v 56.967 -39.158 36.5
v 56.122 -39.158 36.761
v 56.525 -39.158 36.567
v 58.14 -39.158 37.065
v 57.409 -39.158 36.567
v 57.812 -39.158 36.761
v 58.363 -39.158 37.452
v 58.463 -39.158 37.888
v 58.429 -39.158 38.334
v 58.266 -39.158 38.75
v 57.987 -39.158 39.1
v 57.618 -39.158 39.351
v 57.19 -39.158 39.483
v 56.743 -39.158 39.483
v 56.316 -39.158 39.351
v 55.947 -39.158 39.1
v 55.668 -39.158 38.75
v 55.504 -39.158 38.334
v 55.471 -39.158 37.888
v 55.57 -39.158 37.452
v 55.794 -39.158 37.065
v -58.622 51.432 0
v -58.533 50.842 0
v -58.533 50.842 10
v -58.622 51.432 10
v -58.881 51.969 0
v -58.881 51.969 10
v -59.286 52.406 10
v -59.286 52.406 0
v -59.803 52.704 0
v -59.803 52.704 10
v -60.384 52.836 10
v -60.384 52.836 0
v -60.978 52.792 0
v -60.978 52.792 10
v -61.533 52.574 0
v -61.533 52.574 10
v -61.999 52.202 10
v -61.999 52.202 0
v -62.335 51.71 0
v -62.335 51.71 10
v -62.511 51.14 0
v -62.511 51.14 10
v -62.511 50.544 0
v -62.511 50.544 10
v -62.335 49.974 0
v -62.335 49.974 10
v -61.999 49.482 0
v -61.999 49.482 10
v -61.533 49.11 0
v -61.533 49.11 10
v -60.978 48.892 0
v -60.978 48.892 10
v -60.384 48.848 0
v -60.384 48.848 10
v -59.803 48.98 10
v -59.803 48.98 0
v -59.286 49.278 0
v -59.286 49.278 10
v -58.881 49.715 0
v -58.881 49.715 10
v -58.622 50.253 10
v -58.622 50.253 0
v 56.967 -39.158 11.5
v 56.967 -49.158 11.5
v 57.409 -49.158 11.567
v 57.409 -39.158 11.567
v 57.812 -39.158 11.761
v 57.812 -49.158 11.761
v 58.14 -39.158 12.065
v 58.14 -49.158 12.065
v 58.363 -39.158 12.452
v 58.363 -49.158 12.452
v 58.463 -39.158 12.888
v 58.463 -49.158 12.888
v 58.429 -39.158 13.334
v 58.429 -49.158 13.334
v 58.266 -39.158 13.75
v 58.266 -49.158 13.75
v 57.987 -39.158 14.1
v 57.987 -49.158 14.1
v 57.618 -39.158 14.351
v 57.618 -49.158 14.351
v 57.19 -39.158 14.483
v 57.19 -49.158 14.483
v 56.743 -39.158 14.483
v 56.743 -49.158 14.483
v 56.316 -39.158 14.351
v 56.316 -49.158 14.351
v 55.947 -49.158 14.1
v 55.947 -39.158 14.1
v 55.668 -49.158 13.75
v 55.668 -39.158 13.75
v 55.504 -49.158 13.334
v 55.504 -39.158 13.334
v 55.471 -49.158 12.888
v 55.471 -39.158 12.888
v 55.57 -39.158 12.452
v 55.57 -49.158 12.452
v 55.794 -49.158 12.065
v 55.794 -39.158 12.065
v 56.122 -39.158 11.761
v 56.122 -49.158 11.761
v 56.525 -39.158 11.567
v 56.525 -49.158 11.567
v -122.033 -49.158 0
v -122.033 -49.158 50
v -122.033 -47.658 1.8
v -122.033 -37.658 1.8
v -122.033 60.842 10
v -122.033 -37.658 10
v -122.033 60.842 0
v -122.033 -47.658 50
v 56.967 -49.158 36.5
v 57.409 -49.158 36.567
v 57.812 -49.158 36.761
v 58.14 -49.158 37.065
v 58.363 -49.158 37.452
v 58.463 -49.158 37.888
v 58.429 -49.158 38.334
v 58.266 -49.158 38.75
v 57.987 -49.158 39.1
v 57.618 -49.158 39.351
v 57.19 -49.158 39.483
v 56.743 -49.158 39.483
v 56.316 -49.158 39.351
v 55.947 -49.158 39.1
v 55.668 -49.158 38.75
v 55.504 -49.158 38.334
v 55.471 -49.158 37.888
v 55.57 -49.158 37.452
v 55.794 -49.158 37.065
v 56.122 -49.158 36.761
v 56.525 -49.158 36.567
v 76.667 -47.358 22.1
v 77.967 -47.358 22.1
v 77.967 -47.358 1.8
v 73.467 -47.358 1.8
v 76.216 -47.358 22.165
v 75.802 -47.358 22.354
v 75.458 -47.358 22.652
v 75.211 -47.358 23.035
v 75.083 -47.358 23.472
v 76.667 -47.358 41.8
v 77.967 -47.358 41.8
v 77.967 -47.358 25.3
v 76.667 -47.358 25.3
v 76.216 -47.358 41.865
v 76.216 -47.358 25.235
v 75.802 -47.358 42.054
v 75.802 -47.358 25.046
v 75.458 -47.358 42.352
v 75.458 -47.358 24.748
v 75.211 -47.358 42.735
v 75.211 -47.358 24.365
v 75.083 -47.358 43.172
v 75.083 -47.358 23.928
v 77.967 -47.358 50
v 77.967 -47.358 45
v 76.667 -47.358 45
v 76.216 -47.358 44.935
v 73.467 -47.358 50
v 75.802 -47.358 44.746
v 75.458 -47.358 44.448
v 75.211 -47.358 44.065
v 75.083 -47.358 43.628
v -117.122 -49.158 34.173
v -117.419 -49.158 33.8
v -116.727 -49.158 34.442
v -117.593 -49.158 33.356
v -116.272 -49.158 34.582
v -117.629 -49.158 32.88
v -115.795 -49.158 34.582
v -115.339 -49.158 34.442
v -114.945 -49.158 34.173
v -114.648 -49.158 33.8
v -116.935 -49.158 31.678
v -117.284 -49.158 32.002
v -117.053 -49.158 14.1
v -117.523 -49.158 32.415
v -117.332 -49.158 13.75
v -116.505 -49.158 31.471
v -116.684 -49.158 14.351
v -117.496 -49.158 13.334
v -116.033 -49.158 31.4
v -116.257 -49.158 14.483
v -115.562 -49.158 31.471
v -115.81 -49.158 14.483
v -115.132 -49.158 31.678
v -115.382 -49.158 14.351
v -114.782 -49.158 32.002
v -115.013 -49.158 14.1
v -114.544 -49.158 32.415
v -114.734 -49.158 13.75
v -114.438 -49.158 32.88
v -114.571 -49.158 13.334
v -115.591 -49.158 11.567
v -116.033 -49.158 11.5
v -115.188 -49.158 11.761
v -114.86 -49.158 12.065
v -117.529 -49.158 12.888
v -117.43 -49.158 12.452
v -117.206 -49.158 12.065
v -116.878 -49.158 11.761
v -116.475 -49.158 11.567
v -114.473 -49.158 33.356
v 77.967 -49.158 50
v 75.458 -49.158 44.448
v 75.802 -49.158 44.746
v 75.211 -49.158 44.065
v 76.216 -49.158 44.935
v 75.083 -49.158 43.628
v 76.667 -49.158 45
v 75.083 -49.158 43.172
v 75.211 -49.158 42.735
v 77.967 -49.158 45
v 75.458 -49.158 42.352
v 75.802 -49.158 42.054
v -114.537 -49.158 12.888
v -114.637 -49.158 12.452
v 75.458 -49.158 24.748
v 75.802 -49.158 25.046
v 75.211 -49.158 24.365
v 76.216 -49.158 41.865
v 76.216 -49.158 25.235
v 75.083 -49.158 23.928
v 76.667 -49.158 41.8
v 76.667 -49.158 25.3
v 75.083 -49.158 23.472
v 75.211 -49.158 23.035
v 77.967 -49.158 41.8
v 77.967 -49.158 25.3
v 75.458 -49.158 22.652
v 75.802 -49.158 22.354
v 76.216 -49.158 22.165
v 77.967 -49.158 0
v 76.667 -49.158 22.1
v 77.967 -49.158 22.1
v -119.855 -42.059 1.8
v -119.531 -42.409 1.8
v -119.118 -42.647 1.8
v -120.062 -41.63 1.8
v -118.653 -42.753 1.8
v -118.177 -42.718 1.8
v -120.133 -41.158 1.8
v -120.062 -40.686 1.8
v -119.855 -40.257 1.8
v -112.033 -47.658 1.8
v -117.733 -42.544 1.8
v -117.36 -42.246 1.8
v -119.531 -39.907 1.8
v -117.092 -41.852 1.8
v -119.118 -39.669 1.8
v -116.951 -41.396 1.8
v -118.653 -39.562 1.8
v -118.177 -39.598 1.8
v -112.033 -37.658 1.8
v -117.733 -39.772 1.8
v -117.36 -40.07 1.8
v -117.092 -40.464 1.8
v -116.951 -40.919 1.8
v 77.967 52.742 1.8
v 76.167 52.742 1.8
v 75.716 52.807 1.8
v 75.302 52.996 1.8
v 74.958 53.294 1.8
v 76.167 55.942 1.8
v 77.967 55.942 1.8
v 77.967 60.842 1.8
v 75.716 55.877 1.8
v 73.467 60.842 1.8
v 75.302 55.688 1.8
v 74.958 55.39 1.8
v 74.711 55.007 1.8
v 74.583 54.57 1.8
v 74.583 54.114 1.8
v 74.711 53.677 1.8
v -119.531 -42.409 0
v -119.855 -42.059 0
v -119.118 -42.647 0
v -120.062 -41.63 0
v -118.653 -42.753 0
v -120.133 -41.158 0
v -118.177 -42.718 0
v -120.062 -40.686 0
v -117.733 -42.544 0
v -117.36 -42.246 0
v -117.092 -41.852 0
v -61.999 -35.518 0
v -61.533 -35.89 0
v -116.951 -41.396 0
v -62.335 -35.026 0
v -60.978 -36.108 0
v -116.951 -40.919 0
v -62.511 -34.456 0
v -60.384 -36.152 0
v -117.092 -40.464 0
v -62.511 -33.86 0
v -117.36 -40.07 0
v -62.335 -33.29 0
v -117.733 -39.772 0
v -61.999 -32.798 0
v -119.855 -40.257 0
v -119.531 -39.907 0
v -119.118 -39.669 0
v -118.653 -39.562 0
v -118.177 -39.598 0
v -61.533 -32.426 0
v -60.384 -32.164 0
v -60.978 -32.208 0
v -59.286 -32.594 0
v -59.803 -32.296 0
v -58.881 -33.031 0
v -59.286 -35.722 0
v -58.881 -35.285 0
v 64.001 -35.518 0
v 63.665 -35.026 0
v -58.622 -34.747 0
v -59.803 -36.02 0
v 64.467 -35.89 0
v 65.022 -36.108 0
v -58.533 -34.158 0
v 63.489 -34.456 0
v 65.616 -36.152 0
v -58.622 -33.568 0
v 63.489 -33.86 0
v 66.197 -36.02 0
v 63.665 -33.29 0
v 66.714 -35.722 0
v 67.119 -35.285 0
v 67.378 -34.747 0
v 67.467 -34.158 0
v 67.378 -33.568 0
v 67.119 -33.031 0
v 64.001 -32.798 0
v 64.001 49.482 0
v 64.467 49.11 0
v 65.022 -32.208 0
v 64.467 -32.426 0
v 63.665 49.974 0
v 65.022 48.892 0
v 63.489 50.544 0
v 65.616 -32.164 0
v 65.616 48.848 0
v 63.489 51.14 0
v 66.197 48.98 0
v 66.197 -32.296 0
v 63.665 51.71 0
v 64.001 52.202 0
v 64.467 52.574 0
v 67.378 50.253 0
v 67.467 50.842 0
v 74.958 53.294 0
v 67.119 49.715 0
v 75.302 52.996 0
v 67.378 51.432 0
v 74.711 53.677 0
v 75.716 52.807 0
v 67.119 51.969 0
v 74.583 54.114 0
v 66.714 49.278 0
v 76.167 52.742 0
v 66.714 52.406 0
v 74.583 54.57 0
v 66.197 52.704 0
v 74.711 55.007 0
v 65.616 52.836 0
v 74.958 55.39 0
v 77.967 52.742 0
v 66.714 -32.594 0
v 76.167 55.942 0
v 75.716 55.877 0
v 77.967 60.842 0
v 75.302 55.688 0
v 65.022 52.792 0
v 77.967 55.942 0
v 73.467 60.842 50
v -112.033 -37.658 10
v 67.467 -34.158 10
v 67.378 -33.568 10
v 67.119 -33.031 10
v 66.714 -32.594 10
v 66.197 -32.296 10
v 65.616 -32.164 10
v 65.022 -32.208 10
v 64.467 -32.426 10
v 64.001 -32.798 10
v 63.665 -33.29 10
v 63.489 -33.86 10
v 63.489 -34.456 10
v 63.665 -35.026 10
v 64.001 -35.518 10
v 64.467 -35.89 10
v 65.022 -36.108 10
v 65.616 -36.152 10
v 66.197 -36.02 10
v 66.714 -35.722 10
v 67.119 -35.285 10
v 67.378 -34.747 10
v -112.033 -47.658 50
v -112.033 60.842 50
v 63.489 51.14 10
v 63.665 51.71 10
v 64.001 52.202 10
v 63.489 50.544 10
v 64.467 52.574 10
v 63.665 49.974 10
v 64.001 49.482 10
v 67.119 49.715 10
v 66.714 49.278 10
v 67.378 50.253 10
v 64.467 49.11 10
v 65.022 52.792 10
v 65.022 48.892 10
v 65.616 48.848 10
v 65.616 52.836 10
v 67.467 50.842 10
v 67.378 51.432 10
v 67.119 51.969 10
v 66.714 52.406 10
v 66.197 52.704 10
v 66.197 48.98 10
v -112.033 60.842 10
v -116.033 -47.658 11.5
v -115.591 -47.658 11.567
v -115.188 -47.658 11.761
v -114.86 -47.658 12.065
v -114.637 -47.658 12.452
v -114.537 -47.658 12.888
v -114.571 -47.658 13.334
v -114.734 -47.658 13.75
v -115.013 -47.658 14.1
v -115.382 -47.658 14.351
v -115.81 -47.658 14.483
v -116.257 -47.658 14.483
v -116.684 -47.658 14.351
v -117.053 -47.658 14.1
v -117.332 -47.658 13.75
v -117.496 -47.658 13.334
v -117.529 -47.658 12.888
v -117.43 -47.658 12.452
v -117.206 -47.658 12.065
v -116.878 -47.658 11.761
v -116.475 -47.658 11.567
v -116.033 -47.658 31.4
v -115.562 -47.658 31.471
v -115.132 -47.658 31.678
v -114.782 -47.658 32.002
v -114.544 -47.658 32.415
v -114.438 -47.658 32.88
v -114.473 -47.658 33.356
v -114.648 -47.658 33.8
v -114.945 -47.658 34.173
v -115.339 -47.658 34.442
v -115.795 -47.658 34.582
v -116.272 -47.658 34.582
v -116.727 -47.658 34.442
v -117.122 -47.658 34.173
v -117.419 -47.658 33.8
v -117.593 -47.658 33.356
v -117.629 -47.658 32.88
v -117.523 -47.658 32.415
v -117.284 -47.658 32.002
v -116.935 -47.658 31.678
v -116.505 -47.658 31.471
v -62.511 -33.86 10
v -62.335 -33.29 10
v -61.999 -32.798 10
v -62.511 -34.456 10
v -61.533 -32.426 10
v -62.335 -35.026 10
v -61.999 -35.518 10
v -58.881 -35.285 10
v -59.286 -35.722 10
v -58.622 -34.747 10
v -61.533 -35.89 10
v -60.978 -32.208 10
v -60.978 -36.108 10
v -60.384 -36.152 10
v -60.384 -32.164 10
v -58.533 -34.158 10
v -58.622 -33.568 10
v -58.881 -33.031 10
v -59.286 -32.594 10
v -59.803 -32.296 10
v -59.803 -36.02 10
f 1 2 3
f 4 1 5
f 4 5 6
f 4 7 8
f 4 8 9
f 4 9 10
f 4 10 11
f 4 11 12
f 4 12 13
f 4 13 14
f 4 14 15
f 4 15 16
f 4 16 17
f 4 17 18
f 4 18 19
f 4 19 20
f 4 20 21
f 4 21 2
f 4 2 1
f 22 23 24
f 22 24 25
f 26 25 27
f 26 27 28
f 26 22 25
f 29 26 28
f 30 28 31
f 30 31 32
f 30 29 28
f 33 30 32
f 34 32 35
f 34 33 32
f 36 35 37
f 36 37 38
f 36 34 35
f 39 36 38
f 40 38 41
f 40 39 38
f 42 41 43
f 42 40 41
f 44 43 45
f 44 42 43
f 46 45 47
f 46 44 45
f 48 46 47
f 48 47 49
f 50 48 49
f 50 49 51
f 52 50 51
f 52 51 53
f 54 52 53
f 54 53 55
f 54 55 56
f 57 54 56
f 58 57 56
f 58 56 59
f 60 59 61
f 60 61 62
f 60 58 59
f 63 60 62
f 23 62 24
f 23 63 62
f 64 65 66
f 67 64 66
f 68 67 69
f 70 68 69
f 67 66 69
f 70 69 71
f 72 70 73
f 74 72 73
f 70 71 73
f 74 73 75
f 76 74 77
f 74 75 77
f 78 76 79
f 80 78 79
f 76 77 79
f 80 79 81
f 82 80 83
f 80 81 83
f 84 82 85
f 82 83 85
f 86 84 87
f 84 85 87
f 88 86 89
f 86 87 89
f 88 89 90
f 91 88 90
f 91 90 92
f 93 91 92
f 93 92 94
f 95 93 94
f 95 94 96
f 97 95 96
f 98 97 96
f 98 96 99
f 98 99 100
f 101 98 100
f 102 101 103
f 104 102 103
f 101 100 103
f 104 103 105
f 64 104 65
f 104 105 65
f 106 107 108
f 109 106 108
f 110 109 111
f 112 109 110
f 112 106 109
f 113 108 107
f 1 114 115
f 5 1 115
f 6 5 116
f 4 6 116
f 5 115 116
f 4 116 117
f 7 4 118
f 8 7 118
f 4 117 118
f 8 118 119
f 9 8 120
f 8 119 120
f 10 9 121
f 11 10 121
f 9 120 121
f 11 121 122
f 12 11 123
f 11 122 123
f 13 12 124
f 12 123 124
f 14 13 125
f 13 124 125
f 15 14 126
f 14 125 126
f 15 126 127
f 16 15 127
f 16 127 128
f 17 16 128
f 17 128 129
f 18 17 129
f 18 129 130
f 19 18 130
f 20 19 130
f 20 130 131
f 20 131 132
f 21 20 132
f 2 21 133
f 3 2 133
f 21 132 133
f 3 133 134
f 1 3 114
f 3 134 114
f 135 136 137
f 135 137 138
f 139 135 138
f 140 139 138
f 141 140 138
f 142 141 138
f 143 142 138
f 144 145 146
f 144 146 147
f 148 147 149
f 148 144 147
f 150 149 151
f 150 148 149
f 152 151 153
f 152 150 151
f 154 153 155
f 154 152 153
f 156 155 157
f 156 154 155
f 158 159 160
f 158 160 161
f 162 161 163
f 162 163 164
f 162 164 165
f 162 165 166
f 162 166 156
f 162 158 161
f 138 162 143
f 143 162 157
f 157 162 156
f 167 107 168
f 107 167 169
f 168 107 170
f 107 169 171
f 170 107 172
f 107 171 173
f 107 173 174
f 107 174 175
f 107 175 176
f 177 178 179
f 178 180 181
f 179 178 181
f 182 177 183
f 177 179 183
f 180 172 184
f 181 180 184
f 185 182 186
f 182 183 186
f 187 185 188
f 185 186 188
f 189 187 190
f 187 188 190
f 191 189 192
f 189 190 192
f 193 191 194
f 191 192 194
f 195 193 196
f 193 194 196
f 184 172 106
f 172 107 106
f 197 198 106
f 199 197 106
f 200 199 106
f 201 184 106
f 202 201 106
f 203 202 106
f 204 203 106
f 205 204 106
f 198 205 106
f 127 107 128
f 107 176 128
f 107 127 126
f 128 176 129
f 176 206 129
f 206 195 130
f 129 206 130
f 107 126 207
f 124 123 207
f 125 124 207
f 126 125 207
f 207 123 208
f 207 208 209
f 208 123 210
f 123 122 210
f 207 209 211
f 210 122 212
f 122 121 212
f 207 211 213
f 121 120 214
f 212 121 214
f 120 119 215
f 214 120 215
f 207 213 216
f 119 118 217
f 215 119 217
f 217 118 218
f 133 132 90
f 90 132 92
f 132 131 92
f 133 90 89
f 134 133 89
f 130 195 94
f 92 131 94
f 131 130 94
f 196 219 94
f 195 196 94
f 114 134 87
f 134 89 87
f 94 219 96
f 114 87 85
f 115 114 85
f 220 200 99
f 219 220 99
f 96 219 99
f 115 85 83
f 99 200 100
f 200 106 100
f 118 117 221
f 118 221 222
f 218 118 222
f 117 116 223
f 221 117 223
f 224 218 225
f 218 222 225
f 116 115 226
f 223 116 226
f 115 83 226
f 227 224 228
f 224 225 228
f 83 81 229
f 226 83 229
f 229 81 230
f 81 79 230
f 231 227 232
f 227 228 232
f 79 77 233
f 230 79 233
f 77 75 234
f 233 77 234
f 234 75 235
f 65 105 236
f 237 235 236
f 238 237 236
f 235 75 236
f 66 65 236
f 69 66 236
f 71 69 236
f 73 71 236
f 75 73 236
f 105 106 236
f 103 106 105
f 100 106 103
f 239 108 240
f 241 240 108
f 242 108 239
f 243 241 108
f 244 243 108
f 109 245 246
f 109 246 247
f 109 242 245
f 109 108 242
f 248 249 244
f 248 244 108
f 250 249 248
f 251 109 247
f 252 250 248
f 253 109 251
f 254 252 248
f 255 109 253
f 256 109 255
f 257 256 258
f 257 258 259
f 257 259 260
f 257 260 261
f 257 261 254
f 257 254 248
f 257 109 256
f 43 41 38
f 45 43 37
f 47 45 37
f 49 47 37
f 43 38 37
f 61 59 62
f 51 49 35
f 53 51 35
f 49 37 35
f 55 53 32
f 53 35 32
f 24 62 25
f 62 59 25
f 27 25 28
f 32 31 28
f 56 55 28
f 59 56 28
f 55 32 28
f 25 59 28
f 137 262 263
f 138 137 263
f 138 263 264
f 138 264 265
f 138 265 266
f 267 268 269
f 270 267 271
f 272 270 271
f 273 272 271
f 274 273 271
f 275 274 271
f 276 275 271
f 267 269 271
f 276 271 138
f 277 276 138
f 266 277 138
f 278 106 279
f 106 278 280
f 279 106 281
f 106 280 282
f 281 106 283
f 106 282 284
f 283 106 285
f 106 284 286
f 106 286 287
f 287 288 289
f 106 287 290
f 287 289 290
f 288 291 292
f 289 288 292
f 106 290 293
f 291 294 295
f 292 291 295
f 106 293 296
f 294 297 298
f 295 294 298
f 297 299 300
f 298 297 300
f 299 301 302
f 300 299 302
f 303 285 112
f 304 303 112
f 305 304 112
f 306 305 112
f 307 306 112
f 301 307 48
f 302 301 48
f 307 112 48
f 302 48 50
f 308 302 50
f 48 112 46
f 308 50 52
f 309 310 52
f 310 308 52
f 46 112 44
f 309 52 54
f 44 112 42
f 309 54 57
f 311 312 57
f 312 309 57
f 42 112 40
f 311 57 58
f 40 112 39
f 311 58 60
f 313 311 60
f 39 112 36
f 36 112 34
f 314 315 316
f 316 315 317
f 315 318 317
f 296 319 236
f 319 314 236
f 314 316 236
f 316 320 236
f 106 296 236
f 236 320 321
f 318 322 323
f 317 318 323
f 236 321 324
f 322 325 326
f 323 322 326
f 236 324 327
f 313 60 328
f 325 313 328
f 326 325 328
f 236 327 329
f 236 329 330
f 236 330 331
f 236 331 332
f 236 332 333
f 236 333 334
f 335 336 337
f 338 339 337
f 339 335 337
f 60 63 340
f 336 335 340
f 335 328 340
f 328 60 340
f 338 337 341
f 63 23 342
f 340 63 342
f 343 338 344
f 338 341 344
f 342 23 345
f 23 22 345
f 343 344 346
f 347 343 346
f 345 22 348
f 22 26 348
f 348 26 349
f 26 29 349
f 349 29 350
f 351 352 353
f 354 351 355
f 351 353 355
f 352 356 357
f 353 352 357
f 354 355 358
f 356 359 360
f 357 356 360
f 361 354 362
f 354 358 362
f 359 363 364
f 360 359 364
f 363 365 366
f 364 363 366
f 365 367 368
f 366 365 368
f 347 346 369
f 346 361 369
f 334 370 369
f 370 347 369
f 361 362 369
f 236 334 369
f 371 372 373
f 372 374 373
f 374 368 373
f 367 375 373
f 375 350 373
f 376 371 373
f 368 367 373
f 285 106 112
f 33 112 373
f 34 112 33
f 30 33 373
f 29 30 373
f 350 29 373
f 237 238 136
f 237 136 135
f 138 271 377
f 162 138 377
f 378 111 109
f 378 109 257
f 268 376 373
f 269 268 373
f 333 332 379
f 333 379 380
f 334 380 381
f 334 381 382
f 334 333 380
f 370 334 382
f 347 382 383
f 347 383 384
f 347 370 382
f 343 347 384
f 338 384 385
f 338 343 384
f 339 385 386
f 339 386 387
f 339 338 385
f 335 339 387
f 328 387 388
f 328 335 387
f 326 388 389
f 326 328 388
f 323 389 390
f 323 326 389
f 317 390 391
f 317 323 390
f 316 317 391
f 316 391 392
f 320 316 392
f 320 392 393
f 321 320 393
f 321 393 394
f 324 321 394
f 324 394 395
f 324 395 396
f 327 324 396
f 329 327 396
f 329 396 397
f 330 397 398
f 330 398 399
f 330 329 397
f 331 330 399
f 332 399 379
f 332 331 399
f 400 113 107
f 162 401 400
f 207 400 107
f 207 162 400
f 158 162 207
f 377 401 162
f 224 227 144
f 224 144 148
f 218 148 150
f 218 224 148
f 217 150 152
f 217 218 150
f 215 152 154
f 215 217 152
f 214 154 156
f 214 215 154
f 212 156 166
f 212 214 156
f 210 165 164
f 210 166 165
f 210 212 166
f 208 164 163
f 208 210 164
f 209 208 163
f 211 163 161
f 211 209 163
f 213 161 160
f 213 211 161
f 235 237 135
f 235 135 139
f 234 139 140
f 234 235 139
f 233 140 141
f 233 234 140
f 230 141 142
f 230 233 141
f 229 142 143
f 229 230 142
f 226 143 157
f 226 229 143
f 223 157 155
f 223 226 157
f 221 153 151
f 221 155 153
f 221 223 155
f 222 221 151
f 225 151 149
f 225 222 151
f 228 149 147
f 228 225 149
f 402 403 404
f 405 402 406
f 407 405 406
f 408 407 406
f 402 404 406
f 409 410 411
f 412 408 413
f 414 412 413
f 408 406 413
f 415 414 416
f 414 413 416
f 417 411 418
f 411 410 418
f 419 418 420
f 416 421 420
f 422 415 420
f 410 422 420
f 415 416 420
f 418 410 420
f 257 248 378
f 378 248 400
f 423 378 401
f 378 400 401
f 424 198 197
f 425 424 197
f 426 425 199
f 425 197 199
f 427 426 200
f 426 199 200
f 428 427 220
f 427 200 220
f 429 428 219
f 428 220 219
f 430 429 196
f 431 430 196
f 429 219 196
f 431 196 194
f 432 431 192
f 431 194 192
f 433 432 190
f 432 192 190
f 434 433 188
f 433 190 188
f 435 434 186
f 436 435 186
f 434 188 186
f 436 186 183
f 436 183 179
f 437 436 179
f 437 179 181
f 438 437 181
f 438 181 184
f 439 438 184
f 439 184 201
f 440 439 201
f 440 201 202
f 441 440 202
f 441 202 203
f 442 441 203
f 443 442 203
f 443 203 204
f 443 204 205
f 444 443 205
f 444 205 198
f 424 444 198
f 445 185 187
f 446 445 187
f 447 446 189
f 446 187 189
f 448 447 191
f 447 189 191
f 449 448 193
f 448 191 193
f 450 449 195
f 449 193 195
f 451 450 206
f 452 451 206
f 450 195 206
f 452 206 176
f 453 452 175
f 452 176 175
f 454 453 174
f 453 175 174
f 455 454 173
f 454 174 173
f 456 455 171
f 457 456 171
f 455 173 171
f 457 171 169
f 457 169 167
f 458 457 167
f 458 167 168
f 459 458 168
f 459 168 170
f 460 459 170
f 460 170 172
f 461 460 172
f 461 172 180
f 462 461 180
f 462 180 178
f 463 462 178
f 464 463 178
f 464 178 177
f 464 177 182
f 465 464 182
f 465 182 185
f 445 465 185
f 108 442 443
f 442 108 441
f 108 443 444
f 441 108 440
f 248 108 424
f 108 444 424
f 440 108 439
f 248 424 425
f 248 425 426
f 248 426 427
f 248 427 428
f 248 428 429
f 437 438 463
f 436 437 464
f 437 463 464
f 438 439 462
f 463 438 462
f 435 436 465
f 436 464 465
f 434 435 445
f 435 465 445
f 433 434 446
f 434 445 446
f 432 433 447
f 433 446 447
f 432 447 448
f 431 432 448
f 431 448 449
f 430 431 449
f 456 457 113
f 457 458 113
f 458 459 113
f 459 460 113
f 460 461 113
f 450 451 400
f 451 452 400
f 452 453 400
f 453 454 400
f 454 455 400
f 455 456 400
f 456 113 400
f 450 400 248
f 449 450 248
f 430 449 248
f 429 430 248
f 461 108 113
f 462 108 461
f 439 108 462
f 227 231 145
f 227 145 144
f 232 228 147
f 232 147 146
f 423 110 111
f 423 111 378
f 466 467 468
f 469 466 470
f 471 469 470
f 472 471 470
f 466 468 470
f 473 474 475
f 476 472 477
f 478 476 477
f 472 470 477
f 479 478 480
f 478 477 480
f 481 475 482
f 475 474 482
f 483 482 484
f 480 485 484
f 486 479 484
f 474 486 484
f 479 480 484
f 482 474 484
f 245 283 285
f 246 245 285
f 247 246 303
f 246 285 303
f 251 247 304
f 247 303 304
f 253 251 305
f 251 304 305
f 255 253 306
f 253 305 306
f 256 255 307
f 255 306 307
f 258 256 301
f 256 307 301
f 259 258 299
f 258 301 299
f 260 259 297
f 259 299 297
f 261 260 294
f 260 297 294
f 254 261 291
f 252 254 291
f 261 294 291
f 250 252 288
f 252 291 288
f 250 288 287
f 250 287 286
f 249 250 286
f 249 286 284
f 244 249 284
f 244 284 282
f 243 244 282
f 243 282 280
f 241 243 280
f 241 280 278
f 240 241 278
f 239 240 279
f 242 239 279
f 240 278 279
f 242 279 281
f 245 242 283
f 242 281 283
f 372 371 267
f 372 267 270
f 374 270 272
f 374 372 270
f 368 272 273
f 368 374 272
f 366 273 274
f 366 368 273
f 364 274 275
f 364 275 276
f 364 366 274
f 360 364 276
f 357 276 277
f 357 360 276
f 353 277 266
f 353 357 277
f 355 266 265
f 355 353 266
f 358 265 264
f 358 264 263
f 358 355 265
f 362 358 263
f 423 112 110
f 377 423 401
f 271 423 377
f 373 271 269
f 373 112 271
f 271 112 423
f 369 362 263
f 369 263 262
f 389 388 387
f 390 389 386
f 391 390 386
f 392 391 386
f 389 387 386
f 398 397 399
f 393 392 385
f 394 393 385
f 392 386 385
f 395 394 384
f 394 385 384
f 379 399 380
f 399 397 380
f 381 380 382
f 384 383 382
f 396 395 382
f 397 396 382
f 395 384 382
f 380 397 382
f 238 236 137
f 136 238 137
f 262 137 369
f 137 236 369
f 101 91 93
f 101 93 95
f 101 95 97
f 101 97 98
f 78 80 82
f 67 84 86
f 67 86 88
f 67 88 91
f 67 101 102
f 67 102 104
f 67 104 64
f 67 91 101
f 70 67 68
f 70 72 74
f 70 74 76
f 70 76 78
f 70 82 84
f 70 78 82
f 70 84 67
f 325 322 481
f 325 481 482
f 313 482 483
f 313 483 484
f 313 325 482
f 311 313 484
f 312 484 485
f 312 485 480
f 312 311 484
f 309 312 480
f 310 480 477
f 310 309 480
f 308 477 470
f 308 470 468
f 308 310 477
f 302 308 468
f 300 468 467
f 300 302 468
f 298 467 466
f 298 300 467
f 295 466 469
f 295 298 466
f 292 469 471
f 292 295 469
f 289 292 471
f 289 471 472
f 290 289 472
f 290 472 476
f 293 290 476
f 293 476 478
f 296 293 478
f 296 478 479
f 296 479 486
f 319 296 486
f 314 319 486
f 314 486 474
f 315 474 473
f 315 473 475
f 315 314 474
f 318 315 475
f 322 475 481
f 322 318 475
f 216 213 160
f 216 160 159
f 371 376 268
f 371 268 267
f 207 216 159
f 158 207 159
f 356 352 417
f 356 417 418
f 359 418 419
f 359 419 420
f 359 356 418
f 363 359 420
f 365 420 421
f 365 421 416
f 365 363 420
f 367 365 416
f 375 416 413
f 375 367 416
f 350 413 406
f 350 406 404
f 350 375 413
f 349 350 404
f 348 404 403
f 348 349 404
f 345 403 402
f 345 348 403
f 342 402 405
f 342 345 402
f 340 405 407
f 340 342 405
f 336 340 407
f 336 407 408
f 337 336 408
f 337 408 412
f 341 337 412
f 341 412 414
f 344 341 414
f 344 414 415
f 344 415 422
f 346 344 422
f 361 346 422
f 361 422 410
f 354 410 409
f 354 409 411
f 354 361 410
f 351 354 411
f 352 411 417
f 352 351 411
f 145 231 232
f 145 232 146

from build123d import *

# Parameters (mm, degrees)
SKETCH_1_W          = 200
SKETCH_1_H          = 110
EXTRUDE_1_DEPTH     = 50
SKETCH_2_R          = 2
CUT_EXTRUDE_1_DEPTH = 10
SKETCH_3_W          = 10
SKETCH_3_H          = 108.5
CUT_EXTRUDE_2_DEPTH = 40
SKETCH_6_W          = 4.5
SKETCH_6_H          = 48.2
CUT_EXTRUDE_5_DEPTH = 108.2
SKETCH_4_R          = 1.5
CUT_EXTRUDE_3_DEPTH = 10
SKETCH_5_R          = 1.6
CUT_EXTRUDE_4_DEPTH = 10
SKETCH_7_W          = 10
SKETCH_7_H          = 10
CUT_EXTRUDE_6_DEPTH = 8.2
SKETCH_8_R          = 1.6
CUT_EXTRUDE_7_DEPTH = 1.8


with BuildPart() as part:
    # 草图1 → 拉伸1 (new body)
    with BuildSketch(Plane.XY):
        with Locations((-22.033224223, 5.842062193)):
            Rectangle(SKETCH_1_W, SKETCH_1_H)
    extrude(amount=EXTRUDE_1_DEPTH)

    # 草图2 → 切除-拉伸1 (cut)
    with BuildSketch(Plane.XY):
        with Locations((-60.533224223, 50.842062193)):
            Circle(SKETCH_2_R)
        with Locations((65.466775777, 50.842062193)):
            Circle(SKETCH_2_R)
        with Locations((-60.533224223, -34.157937807)):
            Circle(SKETCH_2_R)
        with Locations((65.466775777, -34.157937807)):
            Circle(SKETCH_2_R)
    extrude(amount=CUT_EXTRUDE_1_DEPTH, mode=Mode.SUBTRACT)

    # 草图3 → 切除-拉伸2 (cut)
    with BuildSketch(Plane.XY.offset(50)):
        with Locations((-117.033224223, 6.592062193)):
            Rectangle(SKETCH_3_W, SKETCH_3_H)
    extrude(amount=-CUT_EXTRUDE_2_DEPTH, mode=Mode.SUBTRACT)

    # 草图6 → 切除-拉伸5 (cut)
    with BuildSketch(Plane(origin=(0, 60.842062193, 0), x_dir=(-1, 0, 0), z_dir=(0, 1, 0))):
        with Locations((-75.716775777, 25.9)):
            Rectangle(SKETCH_6_W, SKETCH_6_H)
    extrude(amount=-CUT_EXTRUDE_5_DEPTH, mode=Mode.SUBTRACT)

    # 草图4 → 切除-拉伸3 (cut)
    with BuildSketch(Plane.XZ.offset(49.157937807)):
        with Locations(Location((-116.033224223, 13, 0), (0, 0, 270))):
            Circle(SKETCH_4_R)
        with Locations(Location((56.966775777, 13, 0), (0, 0, 270))):
            Circle(SKETCH_4_R)
        with Locations(Location((56.966775777, 38, 0), (0, 0, 270))):
            Circle(SKETCH_4_R)
    extrude(amount=-CUT_EXTRUDE_3_DEPTH, mode=Mode.SUBTRACT)

    # 草图5 → 切除-拉伸4 (cut)
    with BuildSketch(Plane.XZ.offset(49.157937807)):
        with Locations(Location((-116.033224223, 33, 0), (0, 0, 270))):
            Circle(SKETCH_5_R)
        with BuildLine():
            Line((77.966775777, 45), (77.966775777, 41.8))
            Line((77.966775777, 41.8), (76.666775777, 41.8))
            ThreePointArc((76.666775777, 41.8), (75.066775777, 43.4), (76.666775777, 45))
            Line((76.666775777, 45), (77.966775777, 45))
        make_face()
        with BuildLine():
            Line((77.966775777, 22.1), (76.666775777, 22.1))
            ThreePointArc((76.666775777, 22.1), (75.066775777, 23.7), (76.666775777, 25.3))
            Line((76.666775777, 25.3), (77.966775777, 25.3))
            Line((77.966775777, 25.3), (77.966775777, 22.1))
        make_face()
    extrude(amount=-CUT_EXTRUDE_4_DEPTH, mode=Mode.SUBTRACT)

    # 草图7 → 切除-拉伸6 (cut)
    with BuildSketch(Plane.XY.offset(10)):
        with Locations((-117.033224223, -42.657937807)):
            Rectangle(SKETCH_7_W, SKETCH_7_H)
    extrude(amount=-CUT_EXTRUDE_6_DEPTH, mode=Mode.SUBTRACT)

    # 草图8 → 切除-拉伸7 (cut)
    with BuildSketch(Plane(origin=(0, 0, 0), x_dir=(-1, 0, 0), z_dir=(0, 0, -1))):
        with Locations((118.533224223, -41.157937807)):
            Circle(SKETCH_8_R)
        with BuildLine():
            Line((-77.966775777, 55.942062193), (-76.166775777, 55.942062193))
            ThreePointArc((-76.166775777, 55.942062193), (-74.566775777, 54.342062193), (-76.166775777, 52.742062193))
            Line((-76.166775777, 52.742062193), (-77.966775777, 52.742062193))
            Line((-77.966775777, 52.742062193), (-77.966775777, 55.942062193))
        make_face()
    extrude(amount=-CUT_EXTRUDE_7_DEPTH, mode=Mode.SUBTRACT)


solid = part.part
